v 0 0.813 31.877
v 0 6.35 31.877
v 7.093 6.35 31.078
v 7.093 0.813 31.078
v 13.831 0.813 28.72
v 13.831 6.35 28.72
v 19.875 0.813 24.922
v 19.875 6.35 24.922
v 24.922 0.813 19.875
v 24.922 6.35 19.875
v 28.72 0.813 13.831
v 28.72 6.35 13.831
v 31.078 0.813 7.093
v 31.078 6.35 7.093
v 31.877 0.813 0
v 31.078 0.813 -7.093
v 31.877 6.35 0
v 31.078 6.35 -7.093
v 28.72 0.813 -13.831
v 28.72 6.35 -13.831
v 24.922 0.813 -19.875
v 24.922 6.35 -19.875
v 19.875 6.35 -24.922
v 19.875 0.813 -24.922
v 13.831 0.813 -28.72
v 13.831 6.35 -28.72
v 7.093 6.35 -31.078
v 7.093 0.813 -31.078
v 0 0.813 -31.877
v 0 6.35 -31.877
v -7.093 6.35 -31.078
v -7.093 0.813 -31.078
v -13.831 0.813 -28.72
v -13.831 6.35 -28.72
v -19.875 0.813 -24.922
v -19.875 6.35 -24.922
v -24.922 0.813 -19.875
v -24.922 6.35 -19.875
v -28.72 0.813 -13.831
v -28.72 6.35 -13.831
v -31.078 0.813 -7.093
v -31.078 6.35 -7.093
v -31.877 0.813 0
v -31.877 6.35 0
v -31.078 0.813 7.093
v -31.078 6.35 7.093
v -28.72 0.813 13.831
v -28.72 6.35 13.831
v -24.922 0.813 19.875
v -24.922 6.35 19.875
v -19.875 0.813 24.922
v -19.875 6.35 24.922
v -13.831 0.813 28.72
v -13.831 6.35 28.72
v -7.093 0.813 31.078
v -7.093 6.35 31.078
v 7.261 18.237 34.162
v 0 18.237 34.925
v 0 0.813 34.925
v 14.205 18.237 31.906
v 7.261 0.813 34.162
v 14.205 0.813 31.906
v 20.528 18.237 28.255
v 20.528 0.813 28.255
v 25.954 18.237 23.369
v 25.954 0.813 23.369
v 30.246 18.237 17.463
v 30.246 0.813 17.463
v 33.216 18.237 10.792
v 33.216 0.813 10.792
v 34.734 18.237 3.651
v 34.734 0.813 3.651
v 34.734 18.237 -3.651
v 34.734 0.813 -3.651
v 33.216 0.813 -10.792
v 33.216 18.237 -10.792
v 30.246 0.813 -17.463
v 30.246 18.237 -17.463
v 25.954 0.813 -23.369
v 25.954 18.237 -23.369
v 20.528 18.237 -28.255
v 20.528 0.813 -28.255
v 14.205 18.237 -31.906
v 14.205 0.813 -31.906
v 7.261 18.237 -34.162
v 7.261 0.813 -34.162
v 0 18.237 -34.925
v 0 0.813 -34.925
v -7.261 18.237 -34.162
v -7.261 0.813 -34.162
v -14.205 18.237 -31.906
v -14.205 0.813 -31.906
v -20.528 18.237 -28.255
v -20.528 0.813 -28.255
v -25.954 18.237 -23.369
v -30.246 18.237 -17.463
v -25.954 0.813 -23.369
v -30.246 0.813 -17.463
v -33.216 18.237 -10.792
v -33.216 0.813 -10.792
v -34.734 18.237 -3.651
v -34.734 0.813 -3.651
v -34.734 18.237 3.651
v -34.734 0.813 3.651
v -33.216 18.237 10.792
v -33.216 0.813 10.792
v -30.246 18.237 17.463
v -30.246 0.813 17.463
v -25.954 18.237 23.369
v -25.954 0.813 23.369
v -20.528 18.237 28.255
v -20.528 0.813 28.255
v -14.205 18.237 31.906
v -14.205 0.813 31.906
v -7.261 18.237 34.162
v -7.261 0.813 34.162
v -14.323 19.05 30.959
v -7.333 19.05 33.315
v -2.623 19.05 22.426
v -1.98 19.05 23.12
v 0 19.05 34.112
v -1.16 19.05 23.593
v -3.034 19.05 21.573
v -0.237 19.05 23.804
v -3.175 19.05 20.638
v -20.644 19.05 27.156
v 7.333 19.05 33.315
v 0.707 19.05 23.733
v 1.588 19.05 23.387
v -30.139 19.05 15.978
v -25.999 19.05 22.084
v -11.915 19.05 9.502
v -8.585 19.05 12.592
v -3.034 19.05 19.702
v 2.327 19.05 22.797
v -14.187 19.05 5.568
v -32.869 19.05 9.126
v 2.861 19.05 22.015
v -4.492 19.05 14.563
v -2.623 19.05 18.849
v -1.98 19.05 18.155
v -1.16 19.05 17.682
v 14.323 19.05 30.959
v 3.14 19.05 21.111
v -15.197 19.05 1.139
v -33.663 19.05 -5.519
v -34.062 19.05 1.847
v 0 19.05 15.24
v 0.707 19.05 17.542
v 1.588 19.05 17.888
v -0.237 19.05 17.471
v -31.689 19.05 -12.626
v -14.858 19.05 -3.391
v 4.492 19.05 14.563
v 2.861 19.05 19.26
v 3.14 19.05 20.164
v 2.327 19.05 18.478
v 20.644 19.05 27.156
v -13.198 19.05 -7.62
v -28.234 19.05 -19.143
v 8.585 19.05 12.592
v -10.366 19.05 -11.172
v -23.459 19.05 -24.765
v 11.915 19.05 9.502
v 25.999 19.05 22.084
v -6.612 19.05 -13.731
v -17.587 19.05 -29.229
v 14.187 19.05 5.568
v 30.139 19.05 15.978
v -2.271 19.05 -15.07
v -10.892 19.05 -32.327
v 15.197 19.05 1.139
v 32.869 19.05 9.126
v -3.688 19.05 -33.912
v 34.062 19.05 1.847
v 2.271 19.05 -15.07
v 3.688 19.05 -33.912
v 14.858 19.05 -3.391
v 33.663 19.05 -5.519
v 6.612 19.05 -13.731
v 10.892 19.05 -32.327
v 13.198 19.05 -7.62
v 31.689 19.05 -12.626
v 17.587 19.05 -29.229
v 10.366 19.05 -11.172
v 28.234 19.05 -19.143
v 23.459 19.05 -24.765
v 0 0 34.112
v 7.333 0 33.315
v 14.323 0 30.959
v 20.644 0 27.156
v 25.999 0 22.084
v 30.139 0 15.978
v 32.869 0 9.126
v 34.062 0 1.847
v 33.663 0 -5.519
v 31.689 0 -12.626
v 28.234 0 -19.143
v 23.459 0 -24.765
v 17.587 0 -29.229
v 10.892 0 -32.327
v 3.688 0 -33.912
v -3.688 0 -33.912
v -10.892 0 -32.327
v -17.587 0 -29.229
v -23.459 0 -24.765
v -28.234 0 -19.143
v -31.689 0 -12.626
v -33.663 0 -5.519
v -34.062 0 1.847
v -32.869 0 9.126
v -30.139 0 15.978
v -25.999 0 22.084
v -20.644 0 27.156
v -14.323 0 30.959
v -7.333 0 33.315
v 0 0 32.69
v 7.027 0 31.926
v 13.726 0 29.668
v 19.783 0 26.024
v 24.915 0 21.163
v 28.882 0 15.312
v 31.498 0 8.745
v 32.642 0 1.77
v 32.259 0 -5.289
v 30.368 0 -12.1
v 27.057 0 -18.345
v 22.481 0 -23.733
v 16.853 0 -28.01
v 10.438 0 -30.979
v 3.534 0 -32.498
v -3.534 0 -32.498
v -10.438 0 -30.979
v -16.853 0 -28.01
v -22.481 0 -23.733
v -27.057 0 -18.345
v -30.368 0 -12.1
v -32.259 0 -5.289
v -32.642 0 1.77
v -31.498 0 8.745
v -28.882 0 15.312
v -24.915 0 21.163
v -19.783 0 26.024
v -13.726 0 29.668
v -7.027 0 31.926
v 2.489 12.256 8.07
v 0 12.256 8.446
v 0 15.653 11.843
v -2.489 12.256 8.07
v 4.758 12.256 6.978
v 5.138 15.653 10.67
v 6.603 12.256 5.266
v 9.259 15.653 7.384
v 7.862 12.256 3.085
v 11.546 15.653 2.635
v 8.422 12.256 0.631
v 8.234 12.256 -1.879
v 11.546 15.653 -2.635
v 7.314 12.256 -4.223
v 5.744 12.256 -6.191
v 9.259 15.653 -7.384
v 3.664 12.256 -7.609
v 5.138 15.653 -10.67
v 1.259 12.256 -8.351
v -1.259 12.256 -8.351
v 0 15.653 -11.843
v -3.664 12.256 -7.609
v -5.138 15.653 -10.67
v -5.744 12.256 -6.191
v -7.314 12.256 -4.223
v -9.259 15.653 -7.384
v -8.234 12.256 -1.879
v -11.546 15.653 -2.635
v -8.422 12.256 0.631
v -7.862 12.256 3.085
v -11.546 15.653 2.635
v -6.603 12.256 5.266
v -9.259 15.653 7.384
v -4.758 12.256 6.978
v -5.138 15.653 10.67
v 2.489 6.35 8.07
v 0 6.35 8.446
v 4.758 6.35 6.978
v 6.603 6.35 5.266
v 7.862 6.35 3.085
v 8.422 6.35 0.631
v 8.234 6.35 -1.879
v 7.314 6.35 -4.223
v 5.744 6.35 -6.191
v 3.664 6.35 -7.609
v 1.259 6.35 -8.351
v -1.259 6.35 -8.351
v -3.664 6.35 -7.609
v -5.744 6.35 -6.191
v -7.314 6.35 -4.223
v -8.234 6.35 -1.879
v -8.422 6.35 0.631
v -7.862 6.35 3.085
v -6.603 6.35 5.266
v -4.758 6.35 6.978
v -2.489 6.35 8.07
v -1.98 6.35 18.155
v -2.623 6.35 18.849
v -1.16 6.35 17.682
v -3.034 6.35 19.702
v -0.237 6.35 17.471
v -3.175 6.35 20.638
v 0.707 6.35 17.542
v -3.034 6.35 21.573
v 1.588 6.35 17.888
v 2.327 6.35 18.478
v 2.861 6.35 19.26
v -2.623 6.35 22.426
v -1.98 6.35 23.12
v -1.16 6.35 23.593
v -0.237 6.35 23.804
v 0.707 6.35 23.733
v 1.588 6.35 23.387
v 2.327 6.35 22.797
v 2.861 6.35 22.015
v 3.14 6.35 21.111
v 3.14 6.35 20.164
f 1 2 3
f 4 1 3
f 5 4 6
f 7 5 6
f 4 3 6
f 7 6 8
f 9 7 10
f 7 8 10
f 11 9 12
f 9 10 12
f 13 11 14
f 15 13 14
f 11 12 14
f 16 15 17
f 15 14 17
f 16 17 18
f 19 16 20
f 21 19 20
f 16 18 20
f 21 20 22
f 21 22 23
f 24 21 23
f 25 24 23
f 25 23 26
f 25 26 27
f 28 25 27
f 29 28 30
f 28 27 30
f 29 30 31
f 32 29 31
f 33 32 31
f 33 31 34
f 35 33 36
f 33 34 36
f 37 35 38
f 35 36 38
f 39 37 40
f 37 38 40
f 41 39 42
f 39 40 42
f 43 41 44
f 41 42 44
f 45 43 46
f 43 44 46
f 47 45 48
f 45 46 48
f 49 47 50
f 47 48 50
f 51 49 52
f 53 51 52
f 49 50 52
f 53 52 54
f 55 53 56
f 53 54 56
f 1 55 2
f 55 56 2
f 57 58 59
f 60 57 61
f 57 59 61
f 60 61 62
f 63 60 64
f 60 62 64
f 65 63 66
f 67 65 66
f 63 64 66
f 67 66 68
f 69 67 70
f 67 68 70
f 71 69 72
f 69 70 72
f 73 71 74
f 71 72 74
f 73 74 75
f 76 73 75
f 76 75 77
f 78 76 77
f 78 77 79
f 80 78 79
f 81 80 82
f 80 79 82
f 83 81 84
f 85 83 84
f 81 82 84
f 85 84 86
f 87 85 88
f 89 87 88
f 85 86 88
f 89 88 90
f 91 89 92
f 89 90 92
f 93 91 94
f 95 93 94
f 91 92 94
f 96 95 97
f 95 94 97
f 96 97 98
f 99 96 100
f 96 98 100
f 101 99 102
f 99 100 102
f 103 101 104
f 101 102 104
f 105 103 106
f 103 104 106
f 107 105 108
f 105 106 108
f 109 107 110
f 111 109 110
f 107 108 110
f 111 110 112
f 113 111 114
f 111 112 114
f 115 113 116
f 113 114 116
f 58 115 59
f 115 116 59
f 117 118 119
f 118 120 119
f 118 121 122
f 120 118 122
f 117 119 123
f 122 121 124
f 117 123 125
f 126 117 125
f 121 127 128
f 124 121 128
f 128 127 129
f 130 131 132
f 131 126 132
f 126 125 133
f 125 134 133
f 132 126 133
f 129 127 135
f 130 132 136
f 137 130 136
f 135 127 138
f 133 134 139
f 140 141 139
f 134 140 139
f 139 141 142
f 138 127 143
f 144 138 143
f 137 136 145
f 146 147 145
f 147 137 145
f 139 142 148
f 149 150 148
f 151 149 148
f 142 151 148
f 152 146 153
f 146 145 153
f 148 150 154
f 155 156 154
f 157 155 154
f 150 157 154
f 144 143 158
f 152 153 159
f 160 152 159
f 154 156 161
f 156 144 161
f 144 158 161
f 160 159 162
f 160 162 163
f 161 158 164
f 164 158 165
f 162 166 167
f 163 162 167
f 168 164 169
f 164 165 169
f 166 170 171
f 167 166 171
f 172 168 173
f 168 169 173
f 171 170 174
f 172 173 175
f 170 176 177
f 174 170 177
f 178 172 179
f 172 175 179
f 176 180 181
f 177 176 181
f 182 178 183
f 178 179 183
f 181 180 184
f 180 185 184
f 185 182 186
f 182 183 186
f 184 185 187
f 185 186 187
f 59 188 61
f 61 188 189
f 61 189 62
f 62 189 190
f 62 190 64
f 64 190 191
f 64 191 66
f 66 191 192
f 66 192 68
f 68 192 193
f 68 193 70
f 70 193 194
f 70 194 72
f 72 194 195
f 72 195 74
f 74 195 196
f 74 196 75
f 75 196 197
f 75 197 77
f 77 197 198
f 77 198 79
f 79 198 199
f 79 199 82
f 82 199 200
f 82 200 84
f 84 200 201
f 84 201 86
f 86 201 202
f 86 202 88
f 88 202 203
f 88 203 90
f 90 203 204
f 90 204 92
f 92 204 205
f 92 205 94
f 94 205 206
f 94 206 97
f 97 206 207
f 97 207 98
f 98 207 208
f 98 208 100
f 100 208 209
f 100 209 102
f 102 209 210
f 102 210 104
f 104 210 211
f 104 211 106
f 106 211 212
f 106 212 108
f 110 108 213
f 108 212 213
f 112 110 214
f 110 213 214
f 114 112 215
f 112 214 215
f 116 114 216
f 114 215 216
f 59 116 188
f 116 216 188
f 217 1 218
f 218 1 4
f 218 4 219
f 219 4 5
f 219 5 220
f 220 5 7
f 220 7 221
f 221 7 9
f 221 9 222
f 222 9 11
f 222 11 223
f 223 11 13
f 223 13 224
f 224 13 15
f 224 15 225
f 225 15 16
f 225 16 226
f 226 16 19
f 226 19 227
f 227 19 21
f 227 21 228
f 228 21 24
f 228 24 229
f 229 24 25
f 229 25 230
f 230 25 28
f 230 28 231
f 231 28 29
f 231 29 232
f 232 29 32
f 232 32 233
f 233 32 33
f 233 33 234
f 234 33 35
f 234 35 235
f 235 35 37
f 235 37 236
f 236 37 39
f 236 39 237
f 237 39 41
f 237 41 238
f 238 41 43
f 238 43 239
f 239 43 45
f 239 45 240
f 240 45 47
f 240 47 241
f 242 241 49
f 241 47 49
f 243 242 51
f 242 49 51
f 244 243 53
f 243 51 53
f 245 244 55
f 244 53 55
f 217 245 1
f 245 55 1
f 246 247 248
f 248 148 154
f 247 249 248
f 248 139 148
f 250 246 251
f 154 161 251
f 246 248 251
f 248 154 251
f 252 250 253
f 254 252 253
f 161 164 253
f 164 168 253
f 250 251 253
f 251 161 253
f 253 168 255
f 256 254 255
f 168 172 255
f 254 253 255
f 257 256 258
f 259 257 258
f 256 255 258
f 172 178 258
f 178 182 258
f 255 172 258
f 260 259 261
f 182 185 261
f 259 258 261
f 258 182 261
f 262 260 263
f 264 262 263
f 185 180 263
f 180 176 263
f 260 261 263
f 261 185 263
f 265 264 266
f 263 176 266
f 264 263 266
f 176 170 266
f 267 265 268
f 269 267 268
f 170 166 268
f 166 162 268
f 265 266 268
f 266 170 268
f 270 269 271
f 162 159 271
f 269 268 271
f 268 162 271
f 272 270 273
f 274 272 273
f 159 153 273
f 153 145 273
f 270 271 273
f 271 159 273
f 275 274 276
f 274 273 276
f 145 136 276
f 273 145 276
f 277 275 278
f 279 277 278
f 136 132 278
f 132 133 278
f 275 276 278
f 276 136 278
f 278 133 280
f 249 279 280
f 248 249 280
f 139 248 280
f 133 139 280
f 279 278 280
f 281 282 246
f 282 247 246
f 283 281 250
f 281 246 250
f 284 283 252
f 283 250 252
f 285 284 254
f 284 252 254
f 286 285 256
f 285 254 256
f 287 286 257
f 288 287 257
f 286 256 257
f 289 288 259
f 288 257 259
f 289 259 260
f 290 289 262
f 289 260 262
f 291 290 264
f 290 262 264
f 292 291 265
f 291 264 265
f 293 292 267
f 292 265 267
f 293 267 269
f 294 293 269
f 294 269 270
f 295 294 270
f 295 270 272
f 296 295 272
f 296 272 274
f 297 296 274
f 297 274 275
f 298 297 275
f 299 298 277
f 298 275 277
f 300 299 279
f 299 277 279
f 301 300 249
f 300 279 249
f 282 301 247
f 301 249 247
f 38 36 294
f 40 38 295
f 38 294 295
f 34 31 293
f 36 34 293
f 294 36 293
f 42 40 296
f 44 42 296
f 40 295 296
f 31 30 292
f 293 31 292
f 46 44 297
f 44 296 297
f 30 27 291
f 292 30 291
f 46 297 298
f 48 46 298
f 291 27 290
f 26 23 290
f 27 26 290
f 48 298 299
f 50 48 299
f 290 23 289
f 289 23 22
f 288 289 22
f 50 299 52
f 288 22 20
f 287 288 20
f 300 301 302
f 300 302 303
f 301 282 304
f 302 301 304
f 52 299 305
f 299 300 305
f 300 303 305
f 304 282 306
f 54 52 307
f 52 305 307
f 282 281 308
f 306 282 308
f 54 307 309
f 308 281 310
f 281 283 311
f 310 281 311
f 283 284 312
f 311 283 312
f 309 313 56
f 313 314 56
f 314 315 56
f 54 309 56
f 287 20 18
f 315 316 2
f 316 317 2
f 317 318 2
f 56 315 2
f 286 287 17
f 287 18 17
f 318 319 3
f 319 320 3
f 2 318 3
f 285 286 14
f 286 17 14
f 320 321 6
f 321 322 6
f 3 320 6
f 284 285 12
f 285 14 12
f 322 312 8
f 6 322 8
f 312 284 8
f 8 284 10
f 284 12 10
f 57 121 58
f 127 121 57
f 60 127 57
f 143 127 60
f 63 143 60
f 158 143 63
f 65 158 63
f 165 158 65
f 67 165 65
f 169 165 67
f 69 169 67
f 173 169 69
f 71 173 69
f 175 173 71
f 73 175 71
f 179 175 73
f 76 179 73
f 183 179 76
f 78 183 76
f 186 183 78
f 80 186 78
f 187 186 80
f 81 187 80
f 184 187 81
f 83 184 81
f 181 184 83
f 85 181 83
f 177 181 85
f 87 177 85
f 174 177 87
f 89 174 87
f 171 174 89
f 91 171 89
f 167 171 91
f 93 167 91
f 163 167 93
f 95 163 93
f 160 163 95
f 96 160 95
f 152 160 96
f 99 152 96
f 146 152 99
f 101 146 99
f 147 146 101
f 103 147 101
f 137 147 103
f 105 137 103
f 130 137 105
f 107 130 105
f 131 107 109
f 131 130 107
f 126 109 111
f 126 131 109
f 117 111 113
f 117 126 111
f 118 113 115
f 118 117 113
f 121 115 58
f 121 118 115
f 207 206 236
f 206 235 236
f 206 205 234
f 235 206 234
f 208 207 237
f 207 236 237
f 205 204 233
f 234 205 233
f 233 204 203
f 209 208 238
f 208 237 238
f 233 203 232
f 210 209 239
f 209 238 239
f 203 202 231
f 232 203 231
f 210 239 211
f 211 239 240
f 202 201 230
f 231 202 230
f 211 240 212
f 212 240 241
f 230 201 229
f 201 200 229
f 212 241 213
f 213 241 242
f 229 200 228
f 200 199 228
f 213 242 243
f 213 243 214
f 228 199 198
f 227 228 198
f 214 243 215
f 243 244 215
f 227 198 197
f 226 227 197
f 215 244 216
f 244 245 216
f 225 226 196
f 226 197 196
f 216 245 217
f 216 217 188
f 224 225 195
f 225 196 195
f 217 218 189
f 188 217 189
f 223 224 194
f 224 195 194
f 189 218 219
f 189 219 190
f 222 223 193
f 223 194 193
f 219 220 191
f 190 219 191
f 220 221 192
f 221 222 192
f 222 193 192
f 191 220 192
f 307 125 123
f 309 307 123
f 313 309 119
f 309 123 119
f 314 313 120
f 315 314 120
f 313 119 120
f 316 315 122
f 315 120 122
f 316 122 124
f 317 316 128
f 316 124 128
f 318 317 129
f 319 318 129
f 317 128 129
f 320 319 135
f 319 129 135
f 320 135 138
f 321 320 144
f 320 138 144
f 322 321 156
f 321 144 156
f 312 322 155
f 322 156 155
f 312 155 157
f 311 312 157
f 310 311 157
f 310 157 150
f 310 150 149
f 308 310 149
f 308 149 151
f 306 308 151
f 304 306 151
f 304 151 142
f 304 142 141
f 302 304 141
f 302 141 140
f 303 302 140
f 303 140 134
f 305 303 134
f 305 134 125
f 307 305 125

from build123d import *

# Parameters (mm, degrees)
F2_SIZE  = 0.8128
F3_R     = 3.175
F4_DEPTH = 25.4


with BuildPart() as f1:
    # F0 (on Right) → F1 (revolve)
    with BuildSketch(Plane.YZ):
        Polygon((19.05, 34.925), (0, 34.925), (0, 31.877), (6.35, 31.877), (6.35, 8.4455), (12.2555, 8.4455), (19.05, 15.24), align=None)
    revolve(axis=Axis((0, 9.525, 0), (0, 1, 0)))

    # F2
    f2_edges = [f1.edges().sort_by_distance(p)[0] for p in [
        (0, 19.05, -34.925),
        (0, 0, -34.925),
        (0, 9.525, 34.925),
        (0, 0, -31.877),
    ]]
    chamfer(f2_edges, length=F2_SIZE)

    # F3 (on face) → F4 (cut)
    with BuildSketch(Plane(origin=(0, 19.05, 0), x_dir=(-1, 0, 0), z_dir=(0, 1, 0))):
        with Locations((0, 20.6375)):
            Circle(F3_R)
    extrude(amount=-F4_DEPTH, mode=Mode.SUBTRACT)


solid = f1.part
